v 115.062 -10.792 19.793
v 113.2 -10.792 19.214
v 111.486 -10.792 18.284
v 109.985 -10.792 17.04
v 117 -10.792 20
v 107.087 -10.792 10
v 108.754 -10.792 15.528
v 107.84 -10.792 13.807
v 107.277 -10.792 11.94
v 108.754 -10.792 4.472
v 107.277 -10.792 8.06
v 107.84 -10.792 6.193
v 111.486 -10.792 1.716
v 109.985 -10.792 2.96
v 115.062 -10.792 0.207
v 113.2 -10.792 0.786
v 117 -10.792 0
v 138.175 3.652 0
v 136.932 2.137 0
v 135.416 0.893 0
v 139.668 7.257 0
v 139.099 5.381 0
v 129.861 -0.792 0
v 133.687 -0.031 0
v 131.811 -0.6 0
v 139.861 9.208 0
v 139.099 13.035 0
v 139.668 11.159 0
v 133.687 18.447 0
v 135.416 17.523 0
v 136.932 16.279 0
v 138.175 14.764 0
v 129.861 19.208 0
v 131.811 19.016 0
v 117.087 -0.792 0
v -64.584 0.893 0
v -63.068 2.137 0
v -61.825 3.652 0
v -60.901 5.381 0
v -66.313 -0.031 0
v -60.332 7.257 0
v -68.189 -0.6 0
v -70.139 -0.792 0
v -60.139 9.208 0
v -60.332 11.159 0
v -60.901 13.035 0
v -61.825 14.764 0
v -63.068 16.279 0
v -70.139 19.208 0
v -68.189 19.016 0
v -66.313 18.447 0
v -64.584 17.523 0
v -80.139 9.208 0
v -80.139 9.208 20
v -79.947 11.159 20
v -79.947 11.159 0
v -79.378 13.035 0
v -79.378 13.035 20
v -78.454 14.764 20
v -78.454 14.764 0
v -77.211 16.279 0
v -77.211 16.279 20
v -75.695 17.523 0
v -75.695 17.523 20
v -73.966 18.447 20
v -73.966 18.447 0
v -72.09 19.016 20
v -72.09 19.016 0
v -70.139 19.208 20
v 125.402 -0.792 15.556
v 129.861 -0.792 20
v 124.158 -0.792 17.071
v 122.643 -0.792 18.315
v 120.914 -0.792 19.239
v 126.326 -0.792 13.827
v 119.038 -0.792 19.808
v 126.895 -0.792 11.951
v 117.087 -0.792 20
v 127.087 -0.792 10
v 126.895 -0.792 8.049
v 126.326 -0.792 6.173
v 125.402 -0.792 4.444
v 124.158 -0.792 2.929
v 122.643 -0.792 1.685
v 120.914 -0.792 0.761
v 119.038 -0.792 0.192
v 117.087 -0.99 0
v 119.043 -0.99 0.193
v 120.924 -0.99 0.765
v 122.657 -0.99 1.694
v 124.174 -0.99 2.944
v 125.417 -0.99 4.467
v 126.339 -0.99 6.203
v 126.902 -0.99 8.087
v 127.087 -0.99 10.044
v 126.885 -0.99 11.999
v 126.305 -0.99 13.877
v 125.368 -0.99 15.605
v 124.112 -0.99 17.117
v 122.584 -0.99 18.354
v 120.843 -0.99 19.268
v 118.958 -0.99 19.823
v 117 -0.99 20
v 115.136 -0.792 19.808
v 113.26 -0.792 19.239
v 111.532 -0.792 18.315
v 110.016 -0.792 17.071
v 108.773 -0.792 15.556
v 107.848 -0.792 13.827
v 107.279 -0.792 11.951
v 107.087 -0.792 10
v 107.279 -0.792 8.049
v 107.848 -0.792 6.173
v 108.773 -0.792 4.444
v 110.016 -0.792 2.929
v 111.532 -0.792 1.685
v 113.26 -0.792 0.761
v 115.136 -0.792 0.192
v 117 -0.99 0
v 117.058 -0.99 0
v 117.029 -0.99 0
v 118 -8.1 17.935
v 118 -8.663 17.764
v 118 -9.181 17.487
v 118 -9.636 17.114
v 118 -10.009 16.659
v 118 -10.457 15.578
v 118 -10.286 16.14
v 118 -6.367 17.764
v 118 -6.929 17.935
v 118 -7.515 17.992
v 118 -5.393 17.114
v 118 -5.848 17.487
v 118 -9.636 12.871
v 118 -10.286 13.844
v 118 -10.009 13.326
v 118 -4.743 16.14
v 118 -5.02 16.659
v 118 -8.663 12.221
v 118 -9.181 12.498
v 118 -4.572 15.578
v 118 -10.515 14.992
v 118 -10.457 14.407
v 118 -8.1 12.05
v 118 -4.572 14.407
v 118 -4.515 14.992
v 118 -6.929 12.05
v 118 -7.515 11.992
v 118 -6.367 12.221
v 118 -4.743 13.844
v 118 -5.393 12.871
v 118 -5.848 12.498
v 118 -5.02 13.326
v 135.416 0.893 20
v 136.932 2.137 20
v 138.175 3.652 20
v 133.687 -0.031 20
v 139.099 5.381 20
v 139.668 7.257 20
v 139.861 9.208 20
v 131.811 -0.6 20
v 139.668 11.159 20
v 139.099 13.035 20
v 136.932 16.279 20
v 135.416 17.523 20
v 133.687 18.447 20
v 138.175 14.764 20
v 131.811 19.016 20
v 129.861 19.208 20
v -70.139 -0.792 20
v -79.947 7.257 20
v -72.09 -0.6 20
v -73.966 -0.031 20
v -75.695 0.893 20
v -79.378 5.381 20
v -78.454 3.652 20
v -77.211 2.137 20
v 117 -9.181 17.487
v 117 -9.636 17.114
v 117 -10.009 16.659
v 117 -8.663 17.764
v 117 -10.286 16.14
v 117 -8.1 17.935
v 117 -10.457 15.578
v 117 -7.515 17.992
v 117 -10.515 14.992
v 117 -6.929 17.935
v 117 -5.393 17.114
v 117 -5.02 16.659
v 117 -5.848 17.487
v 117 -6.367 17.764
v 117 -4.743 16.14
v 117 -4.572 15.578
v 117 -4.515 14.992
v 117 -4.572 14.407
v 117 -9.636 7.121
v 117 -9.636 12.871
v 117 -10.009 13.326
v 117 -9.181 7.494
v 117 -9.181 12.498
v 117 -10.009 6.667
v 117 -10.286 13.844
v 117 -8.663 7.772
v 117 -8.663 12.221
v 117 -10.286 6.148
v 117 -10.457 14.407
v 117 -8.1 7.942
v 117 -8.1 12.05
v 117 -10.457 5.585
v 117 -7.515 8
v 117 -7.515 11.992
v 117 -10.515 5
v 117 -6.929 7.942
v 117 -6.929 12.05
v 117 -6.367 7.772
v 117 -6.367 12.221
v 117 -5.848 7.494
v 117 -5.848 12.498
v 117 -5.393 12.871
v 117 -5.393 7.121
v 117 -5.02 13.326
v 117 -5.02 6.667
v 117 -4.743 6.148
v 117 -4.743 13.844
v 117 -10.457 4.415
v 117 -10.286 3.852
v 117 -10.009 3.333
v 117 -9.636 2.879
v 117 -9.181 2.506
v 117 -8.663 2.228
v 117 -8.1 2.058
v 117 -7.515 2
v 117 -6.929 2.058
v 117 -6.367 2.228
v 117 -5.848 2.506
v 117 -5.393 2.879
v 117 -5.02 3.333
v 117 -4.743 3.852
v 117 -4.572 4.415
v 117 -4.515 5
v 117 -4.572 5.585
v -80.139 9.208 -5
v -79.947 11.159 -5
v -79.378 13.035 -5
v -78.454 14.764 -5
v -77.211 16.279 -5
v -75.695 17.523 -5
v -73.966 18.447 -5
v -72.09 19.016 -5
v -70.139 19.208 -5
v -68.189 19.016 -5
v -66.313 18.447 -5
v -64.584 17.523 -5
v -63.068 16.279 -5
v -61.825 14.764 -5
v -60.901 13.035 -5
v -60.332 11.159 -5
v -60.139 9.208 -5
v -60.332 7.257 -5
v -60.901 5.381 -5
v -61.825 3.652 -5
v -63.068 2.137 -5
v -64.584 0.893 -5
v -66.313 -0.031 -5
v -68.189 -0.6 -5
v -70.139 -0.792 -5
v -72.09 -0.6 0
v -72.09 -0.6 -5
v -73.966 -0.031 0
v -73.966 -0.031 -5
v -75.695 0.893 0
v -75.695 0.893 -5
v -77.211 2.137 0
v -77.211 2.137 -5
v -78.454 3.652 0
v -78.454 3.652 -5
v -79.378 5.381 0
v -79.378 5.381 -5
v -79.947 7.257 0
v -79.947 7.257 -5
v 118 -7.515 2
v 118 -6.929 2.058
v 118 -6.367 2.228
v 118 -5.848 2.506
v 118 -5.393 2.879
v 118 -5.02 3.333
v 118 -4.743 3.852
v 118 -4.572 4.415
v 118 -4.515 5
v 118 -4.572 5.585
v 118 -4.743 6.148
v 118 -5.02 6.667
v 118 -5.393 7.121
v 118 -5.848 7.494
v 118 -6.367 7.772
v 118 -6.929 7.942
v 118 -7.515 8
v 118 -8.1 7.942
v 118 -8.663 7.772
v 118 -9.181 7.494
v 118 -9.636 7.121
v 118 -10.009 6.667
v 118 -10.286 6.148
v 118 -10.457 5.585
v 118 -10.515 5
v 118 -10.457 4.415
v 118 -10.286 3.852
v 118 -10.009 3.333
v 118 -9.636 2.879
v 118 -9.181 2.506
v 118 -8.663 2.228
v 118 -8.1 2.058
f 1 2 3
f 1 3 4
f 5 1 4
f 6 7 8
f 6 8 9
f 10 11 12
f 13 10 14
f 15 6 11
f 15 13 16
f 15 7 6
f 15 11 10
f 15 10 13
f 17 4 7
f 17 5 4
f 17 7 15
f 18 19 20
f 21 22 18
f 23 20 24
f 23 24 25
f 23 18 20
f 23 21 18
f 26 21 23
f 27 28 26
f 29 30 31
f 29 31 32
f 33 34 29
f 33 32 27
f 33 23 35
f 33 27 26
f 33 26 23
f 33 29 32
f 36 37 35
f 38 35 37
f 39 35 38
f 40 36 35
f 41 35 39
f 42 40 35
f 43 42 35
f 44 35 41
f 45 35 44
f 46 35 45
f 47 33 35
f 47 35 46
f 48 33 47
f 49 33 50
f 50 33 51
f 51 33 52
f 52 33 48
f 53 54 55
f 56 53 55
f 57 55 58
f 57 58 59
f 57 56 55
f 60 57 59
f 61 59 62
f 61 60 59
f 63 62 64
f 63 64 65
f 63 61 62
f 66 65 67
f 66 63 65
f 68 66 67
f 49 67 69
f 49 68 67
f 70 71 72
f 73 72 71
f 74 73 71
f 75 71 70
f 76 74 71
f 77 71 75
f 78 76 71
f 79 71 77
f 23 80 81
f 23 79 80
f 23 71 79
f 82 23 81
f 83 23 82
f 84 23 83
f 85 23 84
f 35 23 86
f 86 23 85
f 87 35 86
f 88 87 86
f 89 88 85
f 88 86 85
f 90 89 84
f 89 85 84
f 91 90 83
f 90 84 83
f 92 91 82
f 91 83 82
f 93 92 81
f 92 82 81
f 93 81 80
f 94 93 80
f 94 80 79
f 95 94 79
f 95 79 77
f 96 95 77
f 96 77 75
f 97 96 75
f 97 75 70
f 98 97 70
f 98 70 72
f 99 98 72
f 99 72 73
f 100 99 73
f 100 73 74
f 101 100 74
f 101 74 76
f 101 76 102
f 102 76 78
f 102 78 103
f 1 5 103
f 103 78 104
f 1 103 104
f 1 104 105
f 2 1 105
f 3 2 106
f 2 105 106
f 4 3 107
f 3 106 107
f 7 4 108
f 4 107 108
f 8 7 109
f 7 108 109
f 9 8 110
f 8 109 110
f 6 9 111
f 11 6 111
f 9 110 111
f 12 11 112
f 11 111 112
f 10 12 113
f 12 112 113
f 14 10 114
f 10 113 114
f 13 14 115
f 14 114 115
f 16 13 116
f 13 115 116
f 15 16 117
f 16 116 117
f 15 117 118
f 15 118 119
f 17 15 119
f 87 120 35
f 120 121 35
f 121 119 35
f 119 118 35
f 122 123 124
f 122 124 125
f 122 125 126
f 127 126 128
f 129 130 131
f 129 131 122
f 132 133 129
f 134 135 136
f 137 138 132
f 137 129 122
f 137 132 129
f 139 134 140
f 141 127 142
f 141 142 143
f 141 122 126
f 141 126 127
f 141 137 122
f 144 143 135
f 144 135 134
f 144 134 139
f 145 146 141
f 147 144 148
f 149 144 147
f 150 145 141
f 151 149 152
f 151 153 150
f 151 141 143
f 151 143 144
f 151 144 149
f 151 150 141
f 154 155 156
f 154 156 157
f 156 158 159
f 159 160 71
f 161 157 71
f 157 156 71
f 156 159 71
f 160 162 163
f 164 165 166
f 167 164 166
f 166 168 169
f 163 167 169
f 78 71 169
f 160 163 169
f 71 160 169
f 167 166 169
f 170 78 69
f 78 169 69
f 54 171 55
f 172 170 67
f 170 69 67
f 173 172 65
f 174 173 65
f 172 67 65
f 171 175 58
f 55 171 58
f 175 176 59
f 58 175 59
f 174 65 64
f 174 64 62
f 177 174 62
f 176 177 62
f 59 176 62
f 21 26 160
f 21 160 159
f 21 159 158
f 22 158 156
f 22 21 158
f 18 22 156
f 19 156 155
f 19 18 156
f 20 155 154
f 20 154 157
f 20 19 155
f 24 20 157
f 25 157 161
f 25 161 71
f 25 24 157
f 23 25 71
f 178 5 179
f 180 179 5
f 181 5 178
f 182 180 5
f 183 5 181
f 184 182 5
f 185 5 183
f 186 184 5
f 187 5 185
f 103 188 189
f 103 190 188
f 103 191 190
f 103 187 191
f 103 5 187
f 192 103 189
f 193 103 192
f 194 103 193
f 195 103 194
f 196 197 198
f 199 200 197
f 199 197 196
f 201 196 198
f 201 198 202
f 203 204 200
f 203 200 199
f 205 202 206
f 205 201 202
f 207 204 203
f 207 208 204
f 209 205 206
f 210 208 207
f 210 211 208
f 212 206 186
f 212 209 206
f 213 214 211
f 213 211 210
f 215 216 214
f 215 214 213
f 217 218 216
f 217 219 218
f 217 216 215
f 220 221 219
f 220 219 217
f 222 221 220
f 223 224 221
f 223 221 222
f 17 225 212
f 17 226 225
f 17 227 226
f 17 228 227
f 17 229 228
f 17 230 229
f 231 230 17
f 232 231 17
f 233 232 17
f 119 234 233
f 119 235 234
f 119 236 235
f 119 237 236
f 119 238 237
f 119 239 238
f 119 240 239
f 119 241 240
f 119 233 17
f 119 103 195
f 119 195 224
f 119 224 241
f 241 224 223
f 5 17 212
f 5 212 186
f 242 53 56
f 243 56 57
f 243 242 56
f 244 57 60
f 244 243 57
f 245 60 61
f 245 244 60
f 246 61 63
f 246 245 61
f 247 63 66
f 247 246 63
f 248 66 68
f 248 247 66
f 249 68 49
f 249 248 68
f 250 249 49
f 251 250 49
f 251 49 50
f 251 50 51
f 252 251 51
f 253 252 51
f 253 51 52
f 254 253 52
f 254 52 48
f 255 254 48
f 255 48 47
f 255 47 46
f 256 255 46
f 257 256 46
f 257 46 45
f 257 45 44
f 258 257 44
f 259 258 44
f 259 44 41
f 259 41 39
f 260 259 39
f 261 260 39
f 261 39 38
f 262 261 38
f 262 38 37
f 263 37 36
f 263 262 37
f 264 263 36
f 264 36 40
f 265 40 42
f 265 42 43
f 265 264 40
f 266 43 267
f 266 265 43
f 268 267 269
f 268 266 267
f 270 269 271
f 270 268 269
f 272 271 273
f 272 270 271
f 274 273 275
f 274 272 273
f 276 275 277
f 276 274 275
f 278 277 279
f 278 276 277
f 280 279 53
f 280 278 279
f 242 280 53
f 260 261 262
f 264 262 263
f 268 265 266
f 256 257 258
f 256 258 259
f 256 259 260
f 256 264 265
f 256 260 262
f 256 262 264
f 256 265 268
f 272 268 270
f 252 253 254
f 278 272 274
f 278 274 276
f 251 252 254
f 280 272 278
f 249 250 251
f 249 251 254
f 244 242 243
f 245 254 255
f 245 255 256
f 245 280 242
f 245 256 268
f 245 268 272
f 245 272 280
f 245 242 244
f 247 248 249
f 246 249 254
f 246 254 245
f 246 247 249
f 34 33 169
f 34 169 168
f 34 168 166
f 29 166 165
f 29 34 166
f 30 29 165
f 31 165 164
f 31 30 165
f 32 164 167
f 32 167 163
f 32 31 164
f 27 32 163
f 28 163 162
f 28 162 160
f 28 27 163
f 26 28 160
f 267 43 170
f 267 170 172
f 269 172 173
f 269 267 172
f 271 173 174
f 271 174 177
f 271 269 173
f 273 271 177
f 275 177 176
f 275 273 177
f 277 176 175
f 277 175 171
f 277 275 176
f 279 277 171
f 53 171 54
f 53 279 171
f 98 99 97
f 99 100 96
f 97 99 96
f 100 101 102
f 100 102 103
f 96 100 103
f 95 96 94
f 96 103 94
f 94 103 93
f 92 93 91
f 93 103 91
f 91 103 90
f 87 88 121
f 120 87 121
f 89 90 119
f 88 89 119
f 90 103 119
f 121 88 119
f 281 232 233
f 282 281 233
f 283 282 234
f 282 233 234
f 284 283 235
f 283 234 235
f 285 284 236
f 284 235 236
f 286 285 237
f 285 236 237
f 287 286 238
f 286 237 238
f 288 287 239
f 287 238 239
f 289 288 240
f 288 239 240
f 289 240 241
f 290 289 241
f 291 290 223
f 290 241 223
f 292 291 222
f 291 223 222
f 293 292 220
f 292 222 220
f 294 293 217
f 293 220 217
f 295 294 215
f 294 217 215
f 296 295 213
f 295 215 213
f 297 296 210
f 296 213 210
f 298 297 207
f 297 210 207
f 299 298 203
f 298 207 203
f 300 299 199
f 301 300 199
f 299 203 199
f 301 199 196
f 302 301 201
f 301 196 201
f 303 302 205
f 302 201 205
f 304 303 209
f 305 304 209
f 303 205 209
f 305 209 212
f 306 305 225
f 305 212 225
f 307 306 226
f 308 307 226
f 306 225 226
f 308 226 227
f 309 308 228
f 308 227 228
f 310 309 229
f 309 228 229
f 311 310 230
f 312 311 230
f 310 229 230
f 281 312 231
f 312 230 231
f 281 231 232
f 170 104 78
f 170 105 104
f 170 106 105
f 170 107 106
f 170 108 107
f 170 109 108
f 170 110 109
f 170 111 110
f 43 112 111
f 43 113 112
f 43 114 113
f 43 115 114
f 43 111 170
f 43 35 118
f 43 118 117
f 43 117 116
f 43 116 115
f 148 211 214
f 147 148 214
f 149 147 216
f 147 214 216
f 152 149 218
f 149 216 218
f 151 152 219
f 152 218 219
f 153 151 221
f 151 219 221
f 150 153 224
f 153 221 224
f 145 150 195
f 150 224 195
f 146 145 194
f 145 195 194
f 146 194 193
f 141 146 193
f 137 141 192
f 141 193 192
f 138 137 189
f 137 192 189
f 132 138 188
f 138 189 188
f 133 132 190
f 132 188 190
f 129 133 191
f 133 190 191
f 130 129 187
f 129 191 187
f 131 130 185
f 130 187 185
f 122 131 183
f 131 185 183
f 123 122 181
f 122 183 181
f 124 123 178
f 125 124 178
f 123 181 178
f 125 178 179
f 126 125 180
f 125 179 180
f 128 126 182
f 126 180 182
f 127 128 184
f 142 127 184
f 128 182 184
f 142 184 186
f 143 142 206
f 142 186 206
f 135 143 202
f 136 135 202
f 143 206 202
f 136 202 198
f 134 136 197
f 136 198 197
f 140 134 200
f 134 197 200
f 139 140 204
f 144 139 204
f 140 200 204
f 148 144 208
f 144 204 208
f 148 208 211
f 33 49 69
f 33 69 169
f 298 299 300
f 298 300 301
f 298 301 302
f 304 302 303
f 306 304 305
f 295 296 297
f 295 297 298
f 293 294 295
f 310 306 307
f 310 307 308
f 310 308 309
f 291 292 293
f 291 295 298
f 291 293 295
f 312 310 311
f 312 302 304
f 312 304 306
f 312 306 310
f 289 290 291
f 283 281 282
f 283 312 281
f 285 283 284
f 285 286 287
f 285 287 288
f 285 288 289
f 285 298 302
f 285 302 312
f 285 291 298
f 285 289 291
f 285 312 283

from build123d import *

# Parameters (mm, degrees)
BOSS_EXTRUDE1_DEPTH = 20
SKETCH4_R           = 10
BOSS_EXTRUDE3_DEPTH = 10
SKETCH5_W           = 23.907996497
SKETCH5_H           = 10.22824498
CUT_EXTRUDE2_DEPTH  = 50
BOSS_EXTRUDE4_START = 5
SKETCH7_R           = 10
BOSS_EXTRUDE4_DEPTH = 5
SKETCH11_R          = 3
BOSS_EXTRUDE7_DEPTH = 1


with BuildPart() as part:
    # Sketch2 → Boss-Extrude1 (new body)
    with BuildSketch(Plane.XY):
        with BuildLine():
            Line((-70.139472481, 19.207806068), (129.860527519, 19.207806068))
            ThreePointArc((129.860527519, 19.207806068), (136.931595331, 16.27887388), (139.860527519, 9.207806068))
            ThreePointArc((139.860527519, 9.207806068), (136.931595331, 2.136738256), (129.860527519, -0.792193932))
            Line((129.860527519, -0.792193932), (-70.139472481, -0.792193932))
            ThreePointArc((-70.139472481, -0.792193932), (-77.210540292, 2.136738256), (-80.139472481, 9.207806068))
            ThreePointArc((-80.139472481, 9.207806068), (-77.210540292, 16.27887388), (-70.139472481, 19.207806068))
        make_face()
    extrude(amount=BOSS_EXTRUDE1_DEPTH)

    # Sketch4 → Boss-Extrude3 (add)
    with BuildSketch(Plane.XZ.offset(0.792193932)):
        with Locations(Location((117.087248421, 10, 0), (0, 0, 270))):
            Circle(SKETCH4_R)
    extrude(amount=BOSS_EXTRUDE3_DEPTH)

    # Sketch5 → Cut-Extrude2 (cut)
    with BuildSketch(Plane(origin=(117, 0, 0), x_dir=(0, 0, -1), z_dir=(1, 0, 0))):
        with Locations((-10.311239758, -6.104621998)):
            Rectangle(SKETCH5_W, SKETCH5_H)
    extrude(amount=CUT_EXTRUDE2_DEPTH, mode=Mode.SUBTRACT)

    # Sketch7 → Boss-Extrude4 (add)
    with BuildSketch(Plane(origin=(0, 0, 0), x_dir=(-1, 0, 0), z_dir=(0, 0, -1)).offset(BOSS_EXTRUDE4_START)):
        with Locations((70.139472481, 9.207806068)):
            Circle(SKETCH7_R)
    extrude(amount=-BOSS_EXTRUDE4_DEPTH)

    # Sketch11 → Boss-Extrude7 (add)
    with BuildSketch(Plane(origin=(117, 0, 0), x_dir=(0, 0, -1), z_dir=(1, 0, 0))):
        with Locations((-14.992294677, -7.514688693)):
            Circle(SKETCH11_R)
        with Locations((-5, -7.514688693)):
            Circle(SKETCH11_R)
    extrude(amount=BOSS_EXTRUDE7_DEPTH)


solid = part.part
